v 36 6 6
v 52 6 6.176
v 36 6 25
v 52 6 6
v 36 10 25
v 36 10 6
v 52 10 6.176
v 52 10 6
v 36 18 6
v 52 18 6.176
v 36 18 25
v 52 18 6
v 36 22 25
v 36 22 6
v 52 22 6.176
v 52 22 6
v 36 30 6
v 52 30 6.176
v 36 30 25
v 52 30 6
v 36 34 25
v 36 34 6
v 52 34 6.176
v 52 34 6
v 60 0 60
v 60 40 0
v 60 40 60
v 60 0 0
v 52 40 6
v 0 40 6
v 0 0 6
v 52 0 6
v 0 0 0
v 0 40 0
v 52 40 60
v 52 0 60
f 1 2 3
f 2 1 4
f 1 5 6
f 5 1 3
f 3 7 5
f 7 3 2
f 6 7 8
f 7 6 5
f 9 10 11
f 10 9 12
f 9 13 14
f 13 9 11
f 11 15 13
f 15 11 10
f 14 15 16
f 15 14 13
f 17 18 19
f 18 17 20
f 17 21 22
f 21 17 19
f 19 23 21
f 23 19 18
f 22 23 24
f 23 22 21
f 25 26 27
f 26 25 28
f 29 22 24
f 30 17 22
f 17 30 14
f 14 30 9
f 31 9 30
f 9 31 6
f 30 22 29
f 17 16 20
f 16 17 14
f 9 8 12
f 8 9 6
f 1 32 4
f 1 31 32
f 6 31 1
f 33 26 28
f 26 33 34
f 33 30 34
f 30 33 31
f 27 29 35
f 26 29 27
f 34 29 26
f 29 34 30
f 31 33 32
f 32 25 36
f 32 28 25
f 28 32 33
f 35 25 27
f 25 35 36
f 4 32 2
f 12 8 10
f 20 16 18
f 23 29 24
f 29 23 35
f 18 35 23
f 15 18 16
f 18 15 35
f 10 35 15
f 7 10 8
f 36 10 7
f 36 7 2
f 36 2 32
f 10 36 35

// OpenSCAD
$fn = 32;

// ----------------------------------------------------------------------
// Rib bracket: 3-gusset L bracket
// ----------------------------------------------------------------------

// --- parameters (mm) ---
base_l = 60;              // foot length, X
base_w = 40;              // foot width, Y
base_t = 6;               // foot thickness
plate_t = 8;              // upright plate thickness
plate_h = 60;             // overall height
gus_l = 16;               // gusset leg along the foot
gus_h = 20;               // gusset height
gus_t = 4;                // gusset thickness
gus_edge = 6;             // gusset margin from the foot edge
n_gus = 3;                // gusset count
fit_tol = 0.1;            // tolerance for press fits, mm
free_tol = 0.5;           // tolerance for clearance fits, mm

gus_pitch = (base_w - 2 * gus_edge - gus_t) / (n_gus - 1);  // gusset pitch

union() {
  cube([base_l, base_w, base_t]);
  translate([base_l - plate_t, 0, base_t - 1])
    cube([plate_t, base_w, plate_h - base_t + 1]);
  for (i = [0 : n_gus - 1])
    translate([base_l - plate_t - gus_l, gus_edge + i * gus_pitch, base_t - 1])
      rotate([-90, 0, 0])
        linear_extrude(height = gus_t)
          polygon(points = [[0, 0], [gus_l + 1, 0], [0, -gus_h]]);
}
